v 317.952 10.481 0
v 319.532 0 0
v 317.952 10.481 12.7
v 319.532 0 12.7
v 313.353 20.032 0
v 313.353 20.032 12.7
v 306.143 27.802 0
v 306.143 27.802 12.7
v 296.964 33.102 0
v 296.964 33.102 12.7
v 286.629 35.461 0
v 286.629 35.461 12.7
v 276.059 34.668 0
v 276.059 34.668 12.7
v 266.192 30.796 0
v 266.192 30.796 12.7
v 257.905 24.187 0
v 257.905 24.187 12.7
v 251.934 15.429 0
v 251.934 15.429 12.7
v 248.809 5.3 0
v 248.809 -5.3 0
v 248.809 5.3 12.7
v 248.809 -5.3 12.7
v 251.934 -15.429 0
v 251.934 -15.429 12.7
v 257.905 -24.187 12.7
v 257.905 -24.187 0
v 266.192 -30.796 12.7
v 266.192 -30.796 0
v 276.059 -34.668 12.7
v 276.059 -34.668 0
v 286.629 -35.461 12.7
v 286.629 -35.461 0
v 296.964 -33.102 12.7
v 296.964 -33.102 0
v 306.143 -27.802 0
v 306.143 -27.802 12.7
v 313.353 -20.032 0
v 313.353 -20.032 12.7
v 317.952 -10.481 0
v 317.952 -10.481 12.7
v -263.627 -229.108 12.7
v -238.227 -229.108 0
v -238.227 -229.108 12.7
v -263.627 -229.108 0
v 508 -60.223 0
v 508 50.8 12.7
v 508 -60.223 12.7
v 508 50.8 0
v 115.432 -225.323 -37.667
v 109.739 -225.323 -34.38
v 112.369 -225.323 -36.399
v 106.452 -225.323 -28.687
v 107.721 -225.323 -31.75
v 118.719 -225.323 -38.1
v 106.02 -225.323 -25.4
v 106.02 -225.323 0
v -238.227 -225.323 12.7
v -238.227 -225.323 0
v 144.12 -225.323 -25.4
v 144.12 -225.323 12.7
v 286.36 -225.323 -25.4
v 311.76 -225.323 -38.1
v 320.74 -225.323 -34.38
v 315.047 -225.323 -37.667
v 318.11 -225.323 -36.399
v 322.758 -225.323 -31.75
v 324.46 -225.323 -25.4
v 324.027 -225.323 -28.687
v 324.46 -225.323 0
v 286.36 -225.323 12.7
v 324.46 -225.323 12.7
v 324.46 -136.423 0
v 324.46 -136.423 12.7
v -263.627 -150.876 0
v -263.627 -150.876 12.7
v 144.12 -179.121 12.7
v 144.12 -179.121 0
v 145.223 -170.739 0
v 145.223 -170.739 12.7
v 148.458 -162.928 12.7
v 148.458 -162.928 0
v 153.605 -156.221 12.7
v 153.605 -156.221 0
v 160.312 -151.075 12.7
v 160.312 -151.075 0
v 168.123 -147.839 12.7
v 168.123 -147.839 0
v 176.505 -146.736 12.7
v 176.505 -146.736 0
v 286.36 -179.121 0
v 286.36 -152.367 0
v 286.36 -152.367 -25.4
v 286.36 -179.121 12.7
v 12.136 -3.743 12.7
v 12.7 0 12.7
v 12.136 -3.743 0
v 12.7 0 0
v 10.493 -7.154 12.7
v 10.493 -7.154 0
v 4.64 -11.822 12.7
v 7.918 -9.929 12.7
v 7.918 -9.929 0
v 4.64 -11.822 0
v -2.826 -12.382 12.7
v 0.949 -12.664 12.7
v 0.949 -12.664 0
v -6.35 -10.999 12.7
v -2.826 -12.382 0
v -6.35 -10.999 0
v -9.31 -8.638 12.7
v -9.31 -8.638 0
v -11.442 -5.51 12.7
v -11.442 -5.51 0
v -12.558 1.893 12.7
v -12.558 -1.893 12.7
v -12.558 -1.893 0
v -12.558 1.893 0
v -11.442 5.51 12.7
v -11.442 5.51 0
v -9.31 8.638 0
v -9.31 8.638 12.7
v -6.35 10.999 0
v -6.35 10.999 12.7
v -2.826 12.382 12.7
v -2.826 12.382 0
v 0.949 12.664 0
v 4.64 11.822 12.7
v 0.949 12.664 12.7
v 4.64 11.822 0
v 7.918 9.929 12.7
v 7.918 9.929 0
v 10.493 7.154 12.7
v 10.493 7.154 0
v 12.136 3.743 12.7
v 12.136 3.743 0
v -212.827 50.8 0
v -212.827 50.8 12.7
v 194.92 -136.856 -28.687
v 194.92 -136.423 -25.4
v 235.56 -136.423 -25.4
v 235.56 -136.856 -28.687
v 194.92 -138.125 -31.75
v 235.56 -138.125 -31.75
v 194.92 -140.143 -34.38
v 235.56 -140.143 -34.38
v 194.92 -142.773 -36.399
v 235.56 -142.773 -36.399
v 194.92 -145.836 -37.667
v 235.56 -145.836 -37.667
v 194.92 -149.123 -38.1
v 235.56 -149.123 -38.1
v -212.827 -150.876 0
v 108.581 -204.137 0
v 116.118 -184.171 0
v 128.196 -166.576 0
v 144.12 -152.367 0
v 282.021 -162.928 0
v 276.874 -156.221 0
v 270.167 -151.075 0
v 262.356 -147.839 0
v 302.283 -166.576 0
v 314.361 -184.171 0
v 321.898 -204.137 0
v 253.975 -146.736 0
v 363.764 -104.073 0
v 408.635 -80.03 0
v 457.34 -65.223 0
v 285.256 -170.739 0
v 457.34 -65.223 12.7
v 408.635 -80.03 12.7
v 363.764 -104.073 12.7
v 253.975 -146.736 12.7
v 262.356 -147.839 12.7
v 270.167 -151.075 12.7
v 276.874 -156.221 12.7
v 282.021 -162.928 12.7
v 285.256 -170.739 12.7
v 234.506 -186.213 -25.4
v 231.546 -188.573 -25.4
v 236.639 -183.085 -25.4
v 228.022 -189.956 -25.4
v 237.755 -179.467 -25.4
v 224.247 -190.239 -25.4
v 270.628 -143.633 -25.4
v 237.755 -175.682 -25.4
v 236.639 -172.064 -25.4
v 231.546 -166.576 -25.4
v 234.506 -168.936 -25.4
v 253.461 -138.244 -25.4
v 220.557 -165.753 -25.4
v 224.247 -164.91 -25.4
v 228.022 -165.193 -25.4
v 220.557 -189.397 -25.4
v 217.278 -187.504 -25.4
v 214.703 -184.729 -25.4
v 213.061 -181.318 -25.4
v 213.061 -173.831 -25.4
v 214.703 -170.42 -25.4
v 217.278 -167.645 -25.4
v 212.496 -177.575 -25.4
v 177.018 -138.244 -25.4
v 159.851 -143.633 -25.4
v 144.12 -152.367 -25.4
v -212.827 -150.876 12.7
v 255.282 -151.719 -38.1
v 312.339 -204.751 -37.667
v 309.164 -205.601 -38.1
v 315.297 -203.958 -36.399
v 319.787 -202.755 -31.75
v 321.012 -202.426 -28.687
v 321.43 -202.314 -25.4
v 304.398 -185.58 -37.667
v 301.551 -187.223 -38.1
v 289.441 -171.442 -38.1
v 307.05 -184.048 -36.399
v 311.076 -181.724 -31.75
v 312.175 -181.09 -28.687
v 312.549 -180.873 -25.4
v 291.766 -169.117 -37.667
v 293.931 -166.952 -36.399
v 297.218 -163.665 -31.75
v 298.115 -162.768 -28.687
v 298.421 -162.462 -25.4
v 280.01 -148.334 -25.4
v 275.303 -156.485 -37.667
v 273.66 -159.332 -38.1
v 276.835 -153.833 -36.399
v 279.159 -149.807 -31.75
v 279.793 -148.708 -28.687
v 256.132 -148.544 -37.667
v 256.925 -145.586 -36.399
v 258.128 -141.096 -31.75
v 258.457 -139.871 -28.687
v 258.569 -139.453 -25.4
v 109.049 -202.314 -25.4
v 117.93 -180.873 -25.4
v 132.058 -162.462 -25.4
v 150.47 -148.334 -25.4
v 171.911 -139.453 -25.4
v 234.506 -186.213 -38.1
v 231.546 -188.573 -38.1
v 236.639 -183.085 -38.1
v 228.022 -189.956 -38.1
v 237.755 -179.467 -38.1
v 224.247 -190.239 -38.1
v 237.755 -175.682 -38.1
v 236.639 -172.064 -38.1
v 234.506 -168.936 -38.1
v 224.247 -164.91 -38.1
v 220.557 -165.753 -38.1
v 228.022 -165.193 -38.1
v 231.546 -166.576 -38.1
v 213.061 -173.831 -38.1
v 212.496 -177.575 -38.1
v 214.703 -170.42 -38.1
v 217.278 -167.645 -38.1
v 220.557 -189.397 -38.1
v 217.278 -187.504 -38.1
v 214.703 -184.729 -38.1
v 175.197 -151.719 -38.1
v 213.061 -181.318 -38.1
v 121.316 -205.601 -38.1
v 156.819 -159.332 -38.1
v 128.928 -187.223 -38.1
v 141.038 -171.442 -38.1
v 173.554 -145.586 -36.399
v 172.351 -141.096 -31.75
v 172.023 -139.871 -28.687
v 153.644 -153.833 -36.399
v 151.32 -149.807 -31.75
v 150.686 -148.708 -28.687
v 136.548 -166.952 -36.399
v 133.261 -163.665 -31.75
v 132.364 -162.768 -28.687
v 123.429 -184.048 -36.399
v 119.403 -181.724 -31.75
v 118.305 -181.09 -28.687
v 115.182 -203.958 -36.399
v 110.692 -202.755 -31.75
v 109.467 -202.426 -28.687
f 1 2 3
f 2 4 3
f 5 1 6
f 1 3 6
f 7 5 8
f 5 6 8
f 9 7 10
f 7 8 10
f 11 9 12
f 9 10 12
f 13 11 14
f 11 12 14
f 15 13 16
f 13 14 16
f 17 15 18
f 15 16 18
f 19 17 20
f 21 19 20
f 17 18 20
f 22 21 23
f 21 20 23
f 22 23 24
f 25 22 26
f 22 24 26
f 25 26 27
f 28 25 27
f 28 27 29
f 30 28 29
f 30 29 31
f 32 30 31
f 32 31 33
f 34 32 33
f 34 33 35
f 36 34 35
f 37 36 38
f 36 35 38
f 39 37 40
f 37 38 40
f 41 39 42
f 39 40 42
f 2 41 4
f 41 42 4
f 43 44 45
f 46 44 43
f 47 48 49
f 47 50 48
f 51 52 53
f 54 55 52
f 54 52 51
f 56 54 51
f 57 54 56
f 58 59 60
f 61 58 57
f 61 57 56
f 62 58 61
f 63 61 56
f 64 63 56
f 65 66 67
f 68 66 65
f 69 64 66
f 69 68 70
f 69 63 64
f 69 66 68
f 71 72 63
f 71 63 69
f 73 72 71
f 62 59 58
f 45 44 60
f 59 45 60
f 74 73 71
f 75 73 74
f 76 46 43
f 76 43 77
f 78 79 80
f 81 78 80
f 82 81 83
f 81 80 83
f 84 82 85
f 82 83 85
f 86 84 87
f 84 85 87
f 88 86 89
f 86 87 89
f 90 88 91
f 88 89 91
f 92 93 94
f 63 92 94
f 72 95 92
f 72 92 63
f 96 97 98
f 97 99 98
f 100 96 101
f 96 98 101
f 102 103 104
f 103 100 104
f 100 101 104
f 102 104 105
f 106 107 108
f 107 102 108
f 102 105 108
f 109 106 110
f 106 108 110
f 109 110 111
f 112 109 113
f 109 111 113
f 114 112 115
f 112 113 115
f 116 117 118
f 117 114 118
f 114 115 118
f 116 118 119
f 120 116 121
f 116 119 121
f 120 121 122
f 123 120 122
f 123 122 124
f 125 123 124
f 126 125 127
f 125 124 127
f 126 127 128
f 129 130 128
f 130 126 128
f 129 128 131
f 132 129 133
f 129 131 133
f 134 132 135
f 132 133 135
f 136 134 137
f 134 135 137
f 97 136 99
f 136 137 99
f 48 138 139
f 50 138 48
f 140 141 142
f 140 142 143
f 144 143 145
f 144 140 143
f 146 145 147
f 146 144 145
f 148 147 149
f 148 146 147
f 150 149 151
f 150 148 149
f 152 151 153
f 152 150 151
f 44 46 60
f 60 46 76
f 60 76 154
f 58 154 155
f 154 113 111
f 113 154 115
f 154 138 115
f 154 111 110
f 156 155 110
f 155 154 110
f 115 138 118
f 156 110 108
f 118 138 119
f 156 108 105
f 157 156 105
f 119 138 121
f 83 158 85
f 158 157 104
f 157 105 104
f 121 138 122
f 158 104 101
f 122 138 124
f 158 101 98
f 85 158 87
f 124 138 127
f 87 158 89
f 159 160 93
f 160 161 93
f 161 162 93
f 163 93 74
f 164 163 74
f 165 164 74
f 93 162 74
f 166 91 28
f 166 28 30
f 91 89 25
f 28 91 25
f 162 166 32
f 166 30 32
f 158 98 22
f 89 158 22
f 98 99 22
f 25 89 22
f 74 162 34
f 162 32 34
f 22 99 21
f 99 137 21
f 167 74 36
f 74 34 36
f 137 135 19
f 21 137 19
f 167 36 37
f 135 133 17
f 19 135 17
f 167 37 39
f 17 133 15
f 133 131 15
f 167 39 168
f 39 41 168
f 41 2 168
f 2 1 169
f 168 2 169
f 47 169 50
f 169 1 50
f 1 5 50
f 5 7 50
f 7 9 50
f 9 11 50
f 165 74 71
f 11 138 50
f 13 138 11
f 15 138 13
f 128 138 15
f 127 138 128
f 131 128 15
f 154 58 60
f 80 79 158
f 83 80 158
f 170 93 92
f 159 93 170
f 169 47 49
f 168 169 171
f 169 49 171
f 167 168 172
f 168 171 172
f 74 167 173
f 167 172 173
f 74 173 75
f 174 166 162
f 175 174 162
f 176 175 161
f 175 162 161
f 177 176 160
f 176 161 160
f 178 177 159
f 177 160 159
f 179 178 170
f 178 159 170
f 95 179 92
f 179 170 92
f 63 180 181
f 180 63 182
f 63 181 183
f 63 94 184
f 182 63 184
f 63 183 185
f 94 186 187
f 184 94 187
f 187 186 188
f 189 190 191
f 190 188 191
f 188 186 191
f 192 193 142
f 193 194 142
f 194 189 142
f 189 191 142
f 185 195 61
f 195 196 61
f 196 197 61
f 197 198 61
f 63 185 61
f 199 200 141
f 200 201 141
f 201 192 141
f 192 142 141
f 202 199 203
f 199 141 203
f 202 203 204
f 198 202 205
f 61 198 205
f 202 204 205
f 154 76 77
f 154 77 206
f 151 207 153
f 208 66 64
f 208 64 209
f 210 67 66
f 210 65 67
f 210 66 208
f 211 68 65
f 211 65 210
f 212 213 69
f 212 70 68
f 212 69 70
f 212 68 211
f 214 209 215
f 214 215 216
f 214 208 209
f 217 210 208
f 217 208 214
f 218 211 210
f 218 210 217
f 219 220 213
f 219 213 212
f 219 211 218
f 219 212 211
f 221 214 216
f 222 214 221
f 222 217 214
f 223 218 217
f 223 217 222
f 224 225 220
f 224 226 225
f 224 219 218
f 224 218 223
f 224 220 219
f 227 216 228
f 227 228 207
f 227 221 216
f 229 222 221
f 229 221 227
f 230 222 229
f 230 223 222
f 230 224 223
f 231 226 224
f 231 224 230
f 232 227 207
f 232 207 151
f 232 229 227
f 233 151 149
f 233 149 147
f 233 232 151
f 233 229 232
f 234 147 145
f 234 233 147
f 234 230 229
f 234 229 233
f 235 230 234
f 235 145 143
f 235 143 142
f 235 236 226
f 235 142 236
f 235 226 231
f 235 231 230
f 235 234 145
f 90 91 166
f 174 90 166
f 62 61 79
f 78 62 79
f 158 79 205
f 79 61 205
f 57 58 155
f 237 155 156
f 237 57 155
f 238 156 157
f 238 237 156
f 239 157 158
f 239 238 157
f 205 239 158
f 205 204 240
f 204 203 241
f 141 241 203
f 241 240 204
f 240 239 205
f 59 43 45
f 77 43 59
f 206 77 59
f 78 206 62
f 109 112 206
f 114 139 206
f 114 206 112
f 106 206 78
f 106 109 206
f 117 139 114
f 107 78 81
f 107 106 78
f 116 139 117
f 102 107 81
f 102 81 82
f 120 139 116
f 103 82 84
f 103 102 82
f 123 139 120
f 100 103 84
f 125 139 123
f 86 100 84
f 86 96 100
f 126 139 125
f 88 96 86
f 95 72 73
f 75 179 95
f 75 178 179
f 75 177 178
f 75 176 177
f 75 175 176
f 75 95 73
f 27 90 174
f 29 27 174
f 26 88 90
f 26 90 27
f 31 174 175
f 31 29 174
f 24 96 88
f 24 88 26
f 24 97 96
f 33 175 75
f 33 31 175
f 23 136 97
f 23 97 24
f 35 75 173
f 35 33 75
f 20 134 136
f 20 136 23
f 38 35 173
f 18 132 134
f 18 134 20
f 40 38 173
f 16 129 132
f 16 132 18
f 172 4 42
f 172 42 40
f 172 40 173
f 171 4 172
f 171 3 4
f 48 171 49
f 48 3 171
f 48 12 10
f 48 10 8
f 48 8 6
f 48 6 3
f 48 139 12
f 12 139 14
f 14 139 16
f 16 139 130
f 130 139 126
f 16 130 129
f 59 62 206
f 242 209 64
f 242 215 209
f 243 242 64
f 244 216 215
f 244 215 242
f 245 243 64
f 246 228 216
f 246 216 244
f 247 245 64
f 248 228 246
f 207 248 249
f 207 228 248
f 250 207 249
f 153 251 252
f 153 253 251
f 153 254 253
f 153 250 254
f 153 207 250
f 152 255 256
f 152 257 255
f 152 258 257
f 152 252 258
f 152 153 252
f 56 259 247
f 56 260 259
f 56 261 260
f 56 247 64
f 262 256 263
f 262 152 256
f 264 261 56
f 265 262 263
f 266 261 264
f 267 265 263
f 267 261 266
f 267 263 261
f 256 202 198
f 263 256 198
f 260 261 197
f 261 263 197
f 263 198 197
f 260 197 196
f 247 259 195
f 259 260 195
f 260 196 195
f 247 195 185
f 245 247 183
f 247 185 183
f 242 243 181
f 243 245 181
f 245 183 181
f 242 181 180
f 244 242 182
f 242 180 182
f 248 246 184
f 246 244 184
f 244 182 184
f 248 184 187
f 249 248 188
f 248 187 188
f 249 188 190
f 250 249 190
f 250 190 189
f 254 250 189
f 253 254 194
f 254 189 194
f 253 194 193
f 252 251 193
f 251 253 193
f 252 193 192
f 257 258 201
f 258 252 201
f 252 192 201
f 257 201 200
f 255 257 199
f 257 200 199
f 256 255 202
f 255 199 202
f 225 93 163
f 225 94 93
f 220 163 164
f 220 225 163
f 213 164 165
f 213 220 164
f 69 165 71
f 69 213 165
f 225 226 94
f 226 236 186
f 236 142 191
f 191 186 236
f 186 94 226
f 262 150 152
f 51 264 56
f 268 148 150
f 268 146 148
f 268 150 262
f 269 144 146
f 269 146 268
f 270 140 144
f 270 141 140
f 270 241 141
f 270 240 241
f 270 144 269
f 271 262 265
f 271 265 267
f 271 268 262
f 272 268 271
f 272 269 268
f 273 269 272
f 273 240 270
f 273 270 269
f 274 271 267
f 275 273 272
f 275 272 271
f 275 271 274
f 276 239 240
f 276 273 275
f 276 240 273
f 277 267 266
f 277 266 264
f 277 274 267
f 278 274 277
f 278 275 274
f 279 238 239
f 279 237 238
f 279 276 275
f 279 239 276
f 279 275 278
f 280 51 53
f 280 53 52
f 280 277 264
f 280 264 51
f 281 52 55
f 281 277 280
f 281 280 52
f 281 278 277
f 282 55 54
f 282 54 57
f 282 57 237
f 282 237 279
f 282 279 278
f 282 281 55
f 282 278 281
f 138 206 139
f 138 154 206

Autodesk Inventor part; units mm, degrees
ref_plane "YZ Plane" through (0, 0, 0) normal (1, 0, 0) x (0, 1, 0)
ref_plane "XZ Plane" through (0, 0, 0) normal (0, 1, 0) x (-1, 0, 0)
ref_plane "XY Plane" through (0, 0, 0) normal (0, 0, 1) x (1, 0, 0)
sketch "Sketch1" plane through (0, 0, 0) normal (0, 0, 1) x (1, 0, 0)
  circle A0 centre (0, 0) radius 12.7
  arc A1 (50.8, 0) -> (-50.8, 0) centre (0, 0) ccw
  line L0 (-50.8, 0) -> (-50.8, -225.3234)
  line L1 (-50.8, -225.3234) -> (50.8, -225.3234)
  line L2 (50.8, -225.3234) -> (50.8, 0)
  circle A2 centre (176.5046, -179.1208) radius 32.385
  circle A3 centre (253.9746, -179.1208) radius 32.385
  line L3 (144.1196, -225.3234) -> (144.1196, -179.1208)
  line L4 (286.3596, -225.3234) -> (286.3596, -179.1208)
  line L5 (176.5046, -146.7358) -> (253.9746, -146.7358)
  line L6 (50.8, -225.3234) -> (144.1196, -225.3234)
  line L7 (286.3596, -225.3234) -> (508, -225.3234)
  line L8 (-50.8, -225.3234) -> (-238.2266, -225.3234)
  line L9 (-263.6266, -225.3234) -> (-263.6266, -150.876)
  line L10 (-263.6266, -150.876) -> (-212.8266, -150.876)
  line L11 (-212.8266, -150.876) -> (-212.8266, 50.8)
  line L12 (-212.8266, 50.8) -> (508, 50.8)
  line L13 (508, 50.8) -> (508, -225.3234)
  line L14 (-238.2266, -229.108) -> (-238.2266, -225.3234)
  line L15 (-238.2266, -229.108) -> (-263.6266, -229.108)
  line L16 (-263.6266, -229.108) -> (-263.6266, -225.3234)
  dimension "d0" = 176.5046
  dimension "d1" = 179.1208
  dimension "d2" = 64.77
  dimension "d3" = 64.77
  dimension "d4" = 77.47
  dimension "d5" = 212.8266
  dimension "d6" = 50.8
  dimension "d7" = 150.876
  dimension "d8" = 508
  dimension "d9" = 229.108
extrude "Extrusion1" add sketch "Sketch1" along normal blind 12.7 contours L2 L1 L0 A1 | A1 L12 L13 L7 L4 A3 L5 A2 L3 L6 L2 | A1 L0 L8 L14 L15 L16 L9 L10 L11 L12
sketch "Sketch2" plane through (0, 0, 0) normal (0, 0, -1) x (-1, 0, 0)
  line L0 (-286.3596, -225.3234) -> (-324.4596, -225.3234)
  line L1 (-324.4596, -225.3234) -> (-324.4596, -136.4234)
  line L2 (-324.4596, -136.4234) -> (-286.3596, -136.4234)
  line L3 (-286.3596, -136.4234) -> (-286.3596, -225.3234)
  line L4 (-144.1196, -225.3234) -> (-106.0196, -225.3234)
  line L5 (-106.0196, -225.3234) -> (-106.0196, -136.4234)
  line L6 (-106.0196, -136.4234) -> (-144.1196, -136.4234)
  line L7 (-144.1196, -136.4234) -> (-144.1196, -225.3234)
  dimension "d12" = 38.1
  dimension "d13" = 88.9
  dimension "d14" = 38.1
  dimension "d15" = 88.9
extrude "Extrusion2" add sketch "Sketch2" along normal blind 25.4
sketch "Sketch3" plane through (0, 0, -25.4) normal (0, 0, -1) x (-1, 0, 0)
  line L0 (-324.4596, -136.4234) -> (-106.0196, -136.4234)
  line L1 (-106.0196, -136.4234) -> (-106.0196, -225.3234)
  line L2 (-106.0196, -225.3234) -> (-324.4596, -225.3234)
  line L3 (-324.4596, -225.3234) -> (-324.4596, -136.4234)
  line L4 (-106.0196, -136.4234) -> (-106.0196, -225.3234) projected
  circle A0 centre (-225.1964, -177.5746) radius 12.7
  circle A1 centre (0, 0) radius 12.7 projected
  dimension "d18" = 88.9
  dimension "d19" = 0
  dimension "d20" = 25.4
  dimension "d21" = 225.1964
extrude "Extrusion3" add sketch "Sketch3" along normal blind 12.7 contours L0 L1 L2 L3
sketch "Sketch4" plane through (0, 0, 12.7) normal (0, 0, 1) x (1, 0, 0)
  line L0 (286.3596, -225.3234) -> (508, -225.3234) projected
  line L1 (324.4596, -136.4234) -> (508, -60.2234)
  line L2 (508, -60.2234) -> (366.7969, -60.2234)
  arc A0 (508, -60.2234) -> (324.4596, -136.4234) centre (508, -319.3672) ccw
  line L3 (324.4596, -136.4234) -> (324.4596, -225.3234)
  line L4 (508, -60.2234) -> (324.4596, -60.2234)
  line L5 (324.4596, -60.2234) -> (324.4596, -225.3234)
  line L6 (324.4596, -225.3234) -> (508, -225.3234)
  line L7 (508, -225.3234) -> (508, -60.2234)
extrude "Extrusion4" cut sketch "Sketch4" against normal blind 25.4 contours L3 L1 L7 L0 | A0 L1
sketch "Sketch5" plane through (0, 0, -38.1) normal (0, 0, -1) x (-1, 0, 0)
  line L0 (-324.4596, -136.4234) -> (-324.4596, -225.3234) projected
  line L1 (-106.0196, -225.3234) -> (-106.0196, -136.4234) projected
  line L2 (-106.0196, -136.4234) -> (-324.4596, -136.4234) projected
  arc A0 (-235.5596, -136.4234) -> (-324.4596, -225.3234) centre (-235.5596, -225.3234) ccw
  line L3 (-324.4596, -225.3234) -> (-235.5596, -136.4234) construction
  line L4 (-324.4596, -225.3234) -> (-198.736, -225.3234) construction
  arc A1 (-106.0196, -225.3234) -> (-194.9196, -136.4234) centre (-194.9196, -225.3234) ccw
  line L5 (-106.0196, -225.3234) -> (-194.9196, -136.4234) construction
  line L6 (-106.0196, -225.3234) -> (19.704, -225.3234) construction
  point P0 (0, 0)
  dimension "d26" = 45
  dimension "d27" = 135
extrude "Extrusion5" cut sketch "Sketch5" against normal blind 38.1
fillet "Fillet1" radius 12.7 3 edges at (215.2396, -136.4234, -38.1) (132.0578, -162.4616, -38.1) (298.4214, -162.4616, -38.1)
sketch "Sketch6" plane through (0, 0, 12.7) normal (0, 0, 1) x (1, 0, 0)
  arc A0 (508, -60.2234) -> (324.4596, -136.4234) centre (508, -319.3672) ccw projected
  line L0 (508, -60.2234) -> (508, 50.8) projected
  line L1 (508, 50.8) -> (-212.8266, 50.8) projected
  line L2 (-212.8266, 50.8) -> (-212.8266, -150.876) projected
  line L3 (-212.8266, -150.876) -> (-263.6266, -150.876) projected
  line L4 (-263.6266, -150.876) -> (-263.6266, -229.108) projected
  line L5 (-263.6266, -229.108) -> (-238.2266, -229.108) projected
  line L6 (-238.2266, -229.108) -> (-238.2266, -225.3234) projected
  line L7 (-238.2266, -225.3234) -> (144.1196, -225.3234) projected
  line L8 (144.1196, -225.3234) -> (144.1196, -179.1208) projected
  arc A1 (176.5046, -146.7358) -> (144.1196, -179.1208) centre (176.5046, -179.1208) ccw projected
  line L9 (176.5046, -146.7358) -> (253.9746, -146.7358) projected
  arc A2 (286.3596, -179.1208) -> (253.9746, -146.7358) centre (253.9746, -179.1208) ccw projected
  line L10 (286.3596, -179.1208) -> (286.3596, -225.3234) projected
  line L11 (286.3596, -225.3234) -> (324.4596, -225.3234) projected
  line L12 (324.4596, -225.3234) -> (324.4596, -136.4234) projected
  circle A3 centre (0, 0) radius 12.7 projected
sketch "Sketch7" plane through (0, 0, 12.7) normal (0, 0, 1) x (1, 0, 0)
  line L0 (324.4596, -225.3234) -> (324.4596, -136.4234) projected
  circle A0 centre (0, 0) radius 12.7 projected
  line L1 (12.7, 0) -> (283.972, 0)
  circle A1 centre (283.972, 0) radius 35.56
  dimension "d31" = 271.272
  dimension "d32" = 71.12
extrude "Extrusion6" cut sketch "Sketch7" against normal blind 25.4 contours A1
properties part number "Shooter_TopMotorSupportRight"
